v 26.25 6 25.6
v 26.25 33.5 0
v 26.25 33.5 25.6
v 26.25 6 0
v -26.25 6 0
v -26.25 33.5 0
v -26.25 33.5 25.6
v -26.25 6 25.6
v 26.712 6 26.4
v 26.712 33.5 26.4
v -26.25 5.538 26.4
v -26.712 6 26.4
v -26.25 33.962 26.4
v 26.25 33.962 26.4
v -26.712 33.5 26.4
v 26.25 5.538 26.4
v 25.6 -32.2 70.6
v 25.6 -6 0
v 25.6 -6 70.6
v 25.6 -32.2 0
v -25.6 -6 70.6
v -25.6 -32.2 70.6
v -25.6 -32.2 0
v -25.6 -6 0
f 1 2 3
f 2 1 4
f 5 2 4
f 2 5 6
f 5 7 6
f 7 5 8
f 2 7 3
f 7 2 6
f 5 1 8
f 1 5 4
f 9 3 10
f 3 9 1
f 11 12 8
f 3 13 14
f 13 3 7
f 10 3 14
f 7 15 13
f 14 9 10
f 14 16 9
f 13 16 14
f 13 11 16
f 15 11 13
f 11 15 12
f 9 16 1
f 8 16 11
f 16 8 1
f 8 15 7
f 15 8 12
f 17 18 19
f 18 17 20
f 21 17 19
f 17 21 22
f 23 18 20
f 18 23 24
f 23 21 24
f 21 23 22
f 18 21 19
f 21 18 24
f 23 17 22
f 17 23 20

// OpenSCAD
/* Customizable vase mode box
 * By DrLex, v1.0 2019/07
 * Released under Creative Commons - Attribution - Share Alike license */

/* [General] */
// What model to generate. When using ‘both’, don't forget to split into two parts before starting vase mode prints.
render = "both"; //[box, lid, both]

/* [Dimensions] */
// Inner width of the box. All dimensions are mm.
width = 50.0; //[1:0.1:250]

// Inner depth of the box.
depth = 25.0; //[1:0.1:250]

// Inner height of the box.
height = 70.0; //[1:0.1:250]

// Overlap of the lid when placed on the box.
lid = 25.0; //[1:0.1:50]

// Total extra gap between the box and lid.
tolerance = 0.1; //[0:0.01:1]

// Wall thickness of the box. You must set wall thickness for vase mode in your slicer program to this same value when printing, and also set number of bottom layers such that vase mode starts above this height.
wall = 0.60; //[0.2:0.01:2]

/* [Shape] */
// Box shape
shape = "rectangle"; //[rectangle, cylinder]

// Number of segments for the cylinder shape
cylinder_segments = 64; //[3:128]

/* [Hidden] */
box_width = width + 2 * wall;
box_depth = depth + 2 * wall;
box_height = height + wall;
lid_width = box_width + tolerance + 2 * wall;
lid_depth = box_depth + tolerance + 2 * wall;
lid_height = lid + wall;
ridge_h = 0.8;
ridge_a = 30;  // angle of the ridge
ridge_r = tan(ridge_a) * ridge_h;  // cone radius needed to obtain angle

if(shape == "rectangle") {
    shift_box = render == "both" ? -(box_depth + 6) : -box_depth/2;
    shift_lid = render == "both" ? 6 : -lid_depth/2;

    if(render == "box" || render == "both") {
        translate([-box_width/2, shift_box, 0]) cube([box_width, box_depth, box_height]);
    }

    if(render == "lid" || render == "both") {
        translate([-lid_width/2, shift_lid, 0]) {
            cube([lid_width, lid_depth, lid_height]);
            translate([0, 0, lid_height]) hull() {
                cylinder(ridge_h, 0, ridge_r, $fn=4);
                translate([lid_width, 0, 0]) cylinder(ridge_h, 0, ridge_r, $fn=4);
                translate([lid_width, lid_depth, 0]) cylinder(ridge_h, 0, ridge_r, $fn=4);
                translate([0, lid_depth, 0]) cylinder(ridge_h, 0, ridge_r, $fn=4);
            }
        }
    }
}
else {
    shift_box = render == "both" ? -(box_depth/2 + 6) : 0;
    shift_lid = render == "both" ? lid_depth/2 + 6 : 0;

    if(render == "box" || render == "both") {
        scale_y_b = box_depth / box_width;
        translate([0, shift_box, 0]) scale([1, scale_y_b, 1]) cylinder(box_height, box_width/2, box_width/2, $fn=cylinder_segments);
    }

    if(render == "lid" || render == "both") {
        scale_y_l = lid_depth / lid_width;
        translate([0, shift_lid, 0]) {
            scale([1, scale_y_l, 1]) {
                cylinder(lid_height, lid_width/2, lid_width/2, $fn=cylinder_segments);
            }
            // unfortunately hull cannot make a 3D shape out of two 2D circles, so make a 3D contraption instead
            translate([0, 0, lid_height]) scale([1, scale_y_l, 1]) hull() {
                cylinder(ridge_h/2, lid_width/2, lid_width/2, $fn=cylinder_segments);
                undo_scale = (lid_width/2 * scale_y_l + ridge_r) / (scale_y_l * (lid_width/2 + ridge_r));
                scale([1, undo_scale, 1]) cylinder(ridge_h, 0, lid_width/2 + ridge_r, $fn=cylinder_segments);
            }
        }
    }
}
